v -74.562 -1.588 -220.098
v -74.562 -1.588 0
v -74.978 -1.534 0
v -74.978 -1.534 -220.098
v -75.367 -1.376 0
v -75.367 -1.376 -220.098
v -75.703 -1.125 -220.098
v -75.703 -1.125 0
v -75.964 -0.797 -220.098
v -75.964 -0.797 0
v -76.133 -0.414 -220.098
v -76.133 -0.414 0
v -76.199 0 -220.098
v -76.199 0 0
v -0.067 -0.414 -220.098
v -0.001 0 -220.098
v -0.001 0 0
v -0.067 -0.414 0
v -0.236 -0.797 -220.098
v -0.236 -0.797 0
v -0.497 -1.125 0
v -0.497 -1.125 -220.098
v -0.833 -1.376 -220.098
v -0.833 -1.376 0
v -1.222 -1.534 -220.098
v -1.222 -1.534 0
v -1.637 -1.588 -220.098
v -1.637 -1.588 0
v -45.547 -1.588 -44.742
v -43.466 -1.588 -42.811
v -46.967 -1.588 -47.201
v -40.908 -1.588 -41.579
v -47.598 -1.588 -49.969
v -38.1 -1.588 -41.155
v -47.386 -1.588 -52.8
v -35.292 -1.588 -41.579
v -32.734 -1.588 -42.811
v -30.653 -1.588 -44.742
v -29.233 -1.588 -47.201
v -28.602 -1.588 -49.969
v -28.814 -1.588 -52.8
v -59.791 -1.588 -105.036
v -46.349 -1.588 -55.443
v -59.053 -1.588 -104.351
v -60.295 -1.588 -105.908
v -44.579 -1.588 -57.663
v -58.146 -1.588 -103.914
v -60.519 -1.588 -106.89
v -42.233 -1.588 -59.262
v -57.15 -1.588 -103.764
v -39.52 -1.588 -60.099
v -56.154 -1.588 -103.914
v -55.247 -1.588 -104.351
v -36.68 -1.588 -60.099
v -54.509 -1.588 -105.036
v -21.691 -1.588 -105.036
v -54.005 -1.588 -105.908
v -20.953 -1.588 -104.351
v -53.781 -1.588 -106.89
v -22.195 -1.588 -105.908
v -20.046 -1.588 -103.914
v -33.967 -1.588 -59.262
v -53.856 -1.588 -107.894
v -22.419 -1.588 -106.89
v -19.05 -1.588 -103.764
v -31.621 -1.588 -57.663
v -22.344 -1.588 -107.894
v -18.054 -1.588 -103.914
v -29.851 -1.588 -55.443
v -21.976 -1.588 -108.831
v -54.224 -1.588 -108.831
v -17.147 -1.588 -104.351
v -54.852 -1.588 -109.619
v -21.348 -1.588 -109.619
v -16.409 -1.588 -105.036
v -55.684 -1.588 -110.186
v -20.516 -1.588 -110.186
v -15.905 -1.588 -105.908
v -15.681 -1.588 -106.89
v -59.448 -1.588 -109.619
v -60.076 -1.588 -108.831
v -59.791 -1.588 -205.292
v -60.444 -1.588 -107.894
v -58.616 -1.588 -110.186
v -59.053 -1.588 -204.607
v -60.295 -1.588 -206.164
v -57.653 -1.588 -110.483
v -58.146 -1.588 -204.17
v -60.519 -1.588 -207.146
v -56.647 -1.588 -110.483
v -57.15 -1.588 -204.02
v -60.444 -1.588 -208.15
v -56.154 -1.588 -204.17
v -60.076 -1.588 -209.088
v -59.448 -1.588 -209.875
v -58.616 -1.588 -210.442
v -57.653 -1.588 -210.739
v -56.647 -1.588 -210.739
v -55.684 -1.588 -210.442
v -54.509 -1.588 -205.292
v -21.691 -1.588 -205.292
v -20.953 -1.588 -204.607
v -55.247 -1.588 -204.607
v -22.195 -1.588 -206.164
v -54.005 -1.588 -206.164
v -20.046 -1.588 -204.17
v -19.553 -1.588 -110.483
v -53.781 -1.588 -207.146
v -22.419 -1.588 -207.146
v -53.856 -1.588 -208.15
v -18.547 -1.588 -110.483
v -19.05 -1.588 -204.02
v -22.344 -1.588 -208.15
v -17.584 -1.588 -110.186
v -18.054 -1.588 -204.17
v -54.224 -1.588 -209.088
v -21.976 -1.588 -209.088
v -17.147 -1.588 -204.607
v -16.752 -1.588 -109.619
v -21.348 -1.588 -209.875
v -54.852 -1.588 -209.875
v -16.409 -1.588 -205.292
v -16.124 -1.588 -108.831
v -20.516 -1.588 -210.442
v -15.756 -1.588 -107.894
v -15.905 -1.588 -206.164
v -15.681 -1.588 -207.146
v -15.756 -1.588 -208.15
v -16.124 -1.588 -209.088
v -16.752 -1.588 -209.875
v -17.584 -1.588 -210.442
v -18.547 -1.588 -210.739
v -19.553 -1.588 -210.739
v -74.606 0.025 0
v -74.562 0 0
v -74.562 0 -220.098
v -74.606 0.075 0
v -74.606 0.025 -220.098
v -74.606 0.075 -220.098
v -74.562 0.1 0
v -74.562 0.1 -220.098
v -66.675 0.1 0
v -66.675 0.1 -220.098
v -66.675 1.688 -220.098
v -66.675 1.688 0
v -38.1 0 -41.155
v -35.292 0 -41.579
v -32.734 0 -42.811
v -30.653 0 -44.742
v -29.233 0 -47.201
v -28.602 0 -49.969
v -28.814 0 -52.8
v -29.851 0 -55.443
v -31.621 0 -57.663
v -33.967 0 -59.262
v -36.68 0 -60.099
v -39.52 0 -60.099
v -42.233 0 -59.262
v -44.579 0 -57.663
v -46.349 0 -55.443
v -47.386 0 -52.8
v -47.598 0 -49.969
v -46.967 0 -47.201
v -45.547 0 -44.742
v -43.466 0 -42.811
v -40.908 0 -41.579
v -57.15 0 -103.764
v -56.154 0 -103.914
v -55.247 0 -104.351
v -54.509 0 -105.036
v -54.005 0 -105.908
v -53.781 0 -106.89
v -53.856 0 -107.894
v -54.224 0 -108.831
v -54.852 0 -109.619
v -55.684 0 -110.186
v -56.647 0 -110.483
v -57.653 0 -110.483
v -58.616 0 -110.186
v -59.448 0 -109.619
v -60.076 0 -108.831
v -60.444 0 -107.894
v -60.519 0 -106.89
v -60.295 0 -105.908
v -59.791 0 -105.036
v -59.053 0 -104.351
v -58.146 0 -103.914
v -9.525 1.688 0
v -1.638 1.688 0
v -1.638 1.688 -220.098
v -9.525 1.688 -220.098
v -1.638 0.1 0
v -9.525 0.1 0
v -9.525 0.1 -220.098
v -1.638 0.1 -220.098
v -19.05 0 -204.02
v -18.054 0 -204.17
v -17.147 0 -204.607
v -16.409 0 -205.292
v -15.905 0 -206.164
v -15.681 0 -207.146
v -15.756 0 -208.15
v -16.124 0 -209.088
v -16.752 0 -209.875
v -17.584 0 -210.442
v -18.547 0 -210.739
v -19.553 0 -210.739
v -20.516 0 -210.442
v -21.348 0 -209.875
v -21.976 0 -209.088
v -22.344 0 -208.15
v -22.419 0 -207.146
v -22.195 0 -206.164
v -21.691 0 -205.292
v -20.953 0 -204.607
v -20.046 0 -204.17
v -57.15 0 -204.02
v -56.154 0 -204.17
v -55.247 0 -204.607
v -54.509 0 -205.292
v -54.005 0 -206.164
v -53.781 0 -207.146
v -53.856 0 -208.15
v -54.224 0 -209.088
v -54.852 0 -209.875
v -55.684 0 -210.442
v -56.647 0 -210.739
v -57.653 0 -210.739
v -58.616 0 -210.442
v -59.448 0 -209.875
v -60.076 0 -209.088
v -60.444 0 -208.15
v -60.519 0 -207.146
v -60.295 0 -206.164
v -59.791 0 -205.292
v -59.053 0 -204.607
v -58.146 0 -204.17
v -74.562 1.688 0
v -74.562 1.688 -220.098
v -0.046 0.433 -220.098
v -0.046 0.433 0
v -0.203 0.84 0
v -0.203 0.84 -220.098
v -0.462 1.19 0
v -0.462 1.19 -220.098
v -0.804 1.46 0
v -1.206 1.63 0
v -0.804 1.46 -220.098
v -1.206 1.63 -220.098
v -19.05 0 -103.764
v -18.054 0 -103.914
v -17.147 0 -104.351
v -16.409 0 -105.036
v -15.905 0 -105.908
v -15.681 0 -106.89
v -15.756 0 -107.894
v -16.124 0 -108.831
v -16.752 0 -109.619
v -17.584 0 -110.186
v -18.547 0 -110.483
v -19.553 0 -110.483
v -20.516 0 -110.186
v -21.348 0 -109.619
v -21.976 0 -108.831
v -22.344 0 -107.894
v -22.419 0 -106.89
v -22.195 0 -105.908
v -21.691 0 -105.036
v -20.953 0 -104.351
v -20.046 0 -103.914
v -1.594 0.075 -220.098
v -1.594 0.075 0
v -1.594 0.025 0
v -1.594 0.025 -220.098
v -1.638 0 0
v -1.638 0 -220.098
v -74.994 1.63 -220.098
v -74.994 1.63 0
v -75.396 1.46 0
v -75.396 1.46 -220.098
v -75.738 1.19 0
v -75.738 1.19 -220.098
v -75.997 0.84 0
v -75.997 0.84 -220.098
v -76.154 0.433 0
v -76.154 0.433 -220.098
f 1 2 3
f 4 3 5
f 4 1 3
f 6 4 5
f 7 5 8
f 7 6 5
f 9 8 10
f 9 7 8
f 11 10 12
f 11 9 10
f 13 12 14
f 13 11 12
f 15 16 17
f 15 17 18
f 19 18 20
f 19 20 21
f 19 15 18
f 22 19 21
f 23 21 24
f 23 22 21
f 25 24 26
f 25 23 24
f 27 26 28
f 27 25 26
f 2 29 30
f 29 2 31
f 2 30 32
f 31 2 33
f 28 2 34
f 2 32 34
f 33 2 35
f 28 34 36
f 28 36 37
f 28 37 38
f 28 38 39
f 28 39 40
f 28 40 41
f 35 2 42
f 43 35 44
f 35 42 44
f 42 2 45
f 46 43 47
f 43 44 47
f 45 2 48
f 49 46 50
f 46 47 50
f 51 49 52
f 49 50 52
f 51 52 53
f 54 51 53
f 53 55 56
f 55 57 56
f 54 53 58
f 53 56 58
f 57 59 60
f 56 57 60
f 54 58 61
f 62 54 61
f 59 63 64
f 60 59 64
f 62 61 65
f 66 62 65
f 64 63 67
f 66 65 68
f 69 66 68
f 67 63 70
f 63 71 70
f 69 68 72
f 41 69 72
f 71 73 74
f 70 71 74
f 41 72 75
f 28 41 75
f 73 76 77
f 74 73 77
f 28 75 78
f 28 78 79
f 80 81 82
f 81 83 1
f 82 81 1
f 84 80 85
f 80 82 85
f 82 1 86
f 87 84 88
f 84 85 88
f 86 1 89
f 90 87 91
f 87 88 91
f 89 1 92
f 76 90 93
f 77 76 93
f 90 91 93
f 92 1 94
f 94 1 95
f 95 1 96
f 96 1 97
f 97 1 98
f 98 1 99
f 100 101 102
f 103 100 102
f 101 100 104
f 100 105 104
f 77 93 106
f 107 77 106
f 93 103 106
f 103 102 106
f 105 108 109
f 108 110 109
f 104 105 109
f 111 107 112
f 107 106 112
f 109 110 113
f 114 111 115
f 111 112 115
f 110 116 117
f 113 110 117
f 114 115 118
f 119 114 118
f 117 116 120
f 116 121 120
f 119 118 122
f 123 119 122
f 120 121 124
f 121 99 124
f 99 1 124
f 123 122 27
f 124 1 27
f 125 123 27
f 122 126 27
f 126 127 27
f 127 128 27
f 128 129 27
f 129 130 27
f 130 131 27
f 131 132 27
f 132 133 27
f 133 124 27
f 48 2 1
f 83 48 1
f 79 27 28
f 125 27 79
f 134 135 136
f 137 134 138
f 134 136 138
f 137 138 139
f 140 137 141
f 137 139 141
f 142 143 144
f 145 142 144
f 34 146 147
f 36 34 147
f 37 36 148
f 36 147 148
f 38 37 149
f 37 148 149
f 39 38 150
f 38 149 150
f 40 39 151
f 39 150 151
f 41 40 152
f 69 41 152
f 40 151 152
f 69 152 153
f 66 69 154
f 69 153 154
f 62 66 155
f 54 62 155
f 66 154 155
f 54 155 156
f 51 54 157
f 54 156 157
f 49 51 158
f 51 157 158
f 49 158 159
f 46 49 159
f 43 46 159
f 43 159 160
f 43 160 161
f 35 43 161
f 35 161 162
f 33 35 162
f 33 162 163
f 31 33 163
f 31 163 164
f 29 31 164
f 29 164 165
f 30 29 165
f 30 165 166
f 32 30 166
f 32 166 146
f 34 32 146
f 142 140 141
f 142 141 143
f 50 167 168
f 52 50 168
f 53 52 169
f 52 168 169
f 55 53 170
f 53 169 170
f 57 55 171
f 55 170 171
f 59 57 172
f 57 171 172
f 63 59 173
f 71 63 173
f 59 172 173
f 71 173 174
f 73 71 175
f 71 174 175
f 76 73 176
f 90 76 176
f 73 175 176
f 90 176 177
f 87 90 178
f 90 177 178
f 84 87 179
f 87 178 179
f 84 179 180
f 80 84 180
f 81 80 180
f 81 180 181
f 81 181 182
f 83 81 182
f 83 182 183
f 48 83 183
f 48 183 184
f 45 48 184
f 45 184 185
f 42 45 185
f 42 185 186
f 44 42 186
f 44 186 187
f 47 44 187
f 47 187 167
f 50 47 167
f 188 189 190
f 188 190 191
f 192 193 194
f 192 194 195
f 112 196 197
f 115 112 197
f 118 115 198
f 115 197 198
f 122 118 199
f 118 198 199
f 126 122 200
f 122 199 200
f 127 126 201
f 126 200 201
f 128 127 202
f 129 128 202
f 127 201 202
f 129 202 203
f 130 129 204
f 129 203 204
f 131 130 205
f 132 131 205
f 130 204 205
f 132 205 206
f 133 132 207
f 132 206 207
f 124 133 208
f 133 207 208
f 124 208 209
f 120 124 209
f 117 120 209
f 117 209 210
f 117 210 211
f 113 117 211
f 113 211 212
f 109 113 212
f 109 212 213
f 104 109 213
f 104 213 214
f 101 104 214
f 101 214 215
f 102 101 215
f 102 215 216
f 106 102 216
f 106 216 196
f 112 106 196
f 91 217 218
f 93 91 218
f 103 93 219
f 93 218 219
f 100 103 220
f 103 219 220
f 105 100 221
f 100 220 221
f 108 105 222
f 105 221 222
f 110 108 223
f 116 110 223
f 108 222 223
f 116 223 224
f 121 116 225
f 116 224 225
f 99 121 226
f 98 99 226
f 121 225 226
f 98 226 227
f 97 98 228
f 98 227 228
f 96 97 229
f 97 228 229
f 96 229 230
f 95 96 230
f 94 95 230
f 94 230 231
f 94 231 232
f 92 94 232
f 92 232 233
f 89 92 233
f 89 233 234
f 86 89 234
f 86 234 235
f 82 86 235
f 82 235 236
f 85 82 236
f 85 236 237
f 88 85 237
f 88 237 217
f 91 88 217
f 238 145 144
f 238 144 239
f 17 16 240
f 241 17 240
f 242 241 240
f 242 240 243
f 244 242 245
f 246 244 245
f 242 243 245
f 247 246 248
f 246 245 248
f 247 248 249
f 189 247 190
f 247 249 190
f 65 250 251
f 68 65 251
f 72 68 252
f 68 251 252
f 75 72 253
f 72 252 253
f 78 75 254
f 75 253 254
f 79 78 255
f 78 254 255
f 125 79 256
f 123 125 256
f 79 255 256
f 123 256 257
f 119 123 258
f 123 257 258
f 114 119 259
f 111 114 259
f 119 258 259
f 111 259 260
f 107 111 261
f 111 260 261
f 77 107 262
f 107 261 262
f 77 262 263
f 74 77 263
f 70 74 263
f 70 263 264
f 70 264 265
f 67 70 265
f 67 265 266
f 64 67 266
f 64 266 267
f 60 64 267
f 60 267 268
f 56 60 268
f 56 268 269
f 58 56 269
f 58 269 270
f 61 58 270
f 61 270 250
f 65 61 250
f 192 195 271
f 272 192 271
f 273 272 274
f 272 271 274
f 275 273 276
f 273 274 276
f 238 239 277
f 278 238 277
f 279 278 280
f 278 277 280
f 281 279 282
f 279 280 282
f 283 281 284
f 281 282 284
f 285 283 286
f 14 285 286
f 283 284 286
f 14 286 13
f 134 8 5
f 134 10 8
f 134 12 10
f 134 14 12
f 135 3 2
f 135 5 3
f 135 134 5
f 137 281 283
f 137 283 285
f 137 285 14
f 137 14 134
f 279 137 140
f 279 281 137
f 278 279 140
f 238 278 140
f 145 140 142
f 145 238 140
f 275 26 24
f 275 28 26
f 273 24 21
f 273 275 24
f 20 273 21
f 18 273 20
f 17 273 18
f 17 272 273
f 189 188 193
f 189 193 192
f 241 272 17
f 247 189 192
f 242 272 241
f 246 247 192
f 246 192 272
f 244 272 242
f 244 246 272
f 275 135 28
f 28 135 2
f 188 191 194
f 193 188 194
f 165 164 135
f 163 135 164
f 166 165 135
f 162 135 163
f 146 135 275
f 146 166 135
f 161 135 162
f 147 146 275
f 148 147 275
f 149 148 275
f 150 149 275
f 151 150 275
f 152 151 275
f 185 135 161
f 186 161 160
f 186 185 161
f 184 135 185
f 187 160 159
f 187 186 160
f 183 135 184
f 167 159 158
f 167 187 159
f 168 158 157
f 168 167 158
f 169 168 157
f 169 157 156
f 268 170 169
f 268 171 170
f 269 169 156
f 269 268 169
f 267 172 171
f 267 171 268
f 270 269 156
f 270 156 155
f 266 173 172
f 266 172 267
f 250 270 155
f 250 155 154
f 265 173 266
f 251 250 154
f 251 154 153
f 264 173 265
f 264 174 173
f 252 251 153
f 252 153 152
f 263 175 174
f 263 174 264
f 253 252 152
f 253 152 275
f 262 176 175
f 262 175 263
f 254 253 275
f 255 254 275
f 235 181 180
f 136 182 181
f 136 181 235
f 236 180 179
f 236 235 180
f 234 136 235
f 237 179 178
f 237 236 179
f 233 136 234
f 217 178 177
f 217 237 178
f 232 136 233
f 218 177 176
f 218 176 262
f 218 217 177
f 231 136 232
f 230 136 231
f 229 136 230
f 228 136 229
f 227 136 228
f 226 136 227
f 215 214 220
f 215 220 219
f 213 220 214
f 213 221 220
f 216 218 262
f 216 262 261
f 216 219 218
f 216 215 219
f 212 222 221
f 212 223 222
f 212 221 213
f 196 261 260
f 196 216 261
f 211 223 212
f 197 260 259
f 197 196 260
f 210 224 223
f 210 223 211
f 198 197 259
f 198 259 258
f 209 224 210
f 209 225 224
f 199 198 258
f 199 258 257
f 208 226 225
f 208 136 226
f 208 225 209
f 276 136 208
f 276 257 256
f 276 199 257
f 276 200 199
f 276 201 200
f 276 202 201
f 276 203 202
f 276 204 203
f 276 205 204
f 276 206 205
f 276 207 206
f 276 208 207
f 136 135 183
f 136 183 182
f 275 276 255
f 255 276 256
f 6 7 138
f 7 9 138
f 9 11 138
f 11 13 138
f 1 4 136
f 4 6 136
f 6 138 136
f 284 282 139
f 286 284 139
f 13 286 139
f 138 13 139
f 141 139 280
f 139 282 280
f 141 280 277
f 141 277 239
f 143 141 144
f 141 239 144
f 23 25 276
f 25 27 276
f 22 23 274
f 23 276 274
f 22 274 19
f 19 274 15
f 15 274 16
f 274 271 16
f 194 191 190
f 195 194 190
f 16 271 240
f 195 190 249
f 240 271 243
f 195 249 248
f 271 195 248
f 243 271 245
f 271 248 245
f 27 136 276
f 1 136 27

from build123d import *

# Parameters (mm, degrees)
SKETCH1_W          = 76.2
SKETCH1_H          = 220.098493
BASE_FLANGE1_DEPTH = 1.5875
CUT_EXTRUDE1_REACH = 234.921
SKETCH6_R          = 3.3782
SKETCH7_R          = 9.525
CUT_EXTRUDE2_DEPTH = 233.921245869
HEM1_START         = -220.098493
HEM1_DEPTH         = 220.098493
HEM1_2_DEPTH       = 220.098493


# Read off the part's stored shape, not the designer's step: Hem1
# Sheet-metal steps are written as plain solids
with BuildPart() as part:
    # Sketch1 → Base-Flange1 (new body)
    with BuildSketch(Plane(origin=(0, 0, 0), x_dir=(1, 0, 0), z_dir=(0, 1, 0))):
        with Locations((-38.1, 110.0492465)):
            Rectangle(SKETCH1_W, SKETCH1_H)
    extrude(amount=-BASE_FLANGE1_DEPTH)

    # Sketch6 → Cut-Extrude1 (cut, up to next)
    with BuildSketch(Plane(origin=(0, 0, 0), x_dir=(1, 0, 0), z_dir=(0, 1, 0)), mode=Mode.PRIVATE) as cut_extrude1_sk1:
        with Locations(Location((-57.15, 207.398493, 0), (0, 0, 270))):
            Circle(SKETCH6_R)
    cut_extrude1_tool1 = extrude(cut_extrude1_sk1.sketch, amount=-CUT_EXTRUDE1_REACH, mode=Mode.PRIVATE) & part.part
    # Sketch6 → Cut-Extrude1 (cut, up to next)
    with BuildSketch(Plane(origin=(0, 0, 0), x_dir=(1, 0, 0), z_dir=(0, 1, 0)), mode=Mode.PRIVATE) as cut_extrude1_sk2:
        with Locations(Location((-19.05, 207.398493, 0), (0, 0, 270))):
            Circle(SKETCH6_R)
    cut_extrude1_tool2 = extrude(cut_extrude1_sk2.sketch, amount=-CUT_EXTRUDE1_REACH, mode=Mode.PRIVATE) & part.part
    # Sketch6 → Cut-Extrude1 (cut, up to next)
    with BuildSketch(Plane(origin=(0, 0, 0), x_dir=(1, 0, 0), z_dir=(0, 1, 0)), mode=Mode.PRIVATE) as cut_extrude1_sk3:
        with Locations(Location((-19.05, 107.14228, 0), (0, 0, 270))):
            Circle(SKETCH6_R)
    cut_extrude1_tool3 = extrude(cut_extrude1_sk3.sketch, amount=-CUT_EXTRUDE1_REACH, mode=Mode.PRIVATE) & part.part
    # Sketch6 → Cut-Extrude1 (cut, up to next)
    with BuildSketch(Plane(origin=(0, 0, 0), x_dir=(1, 0, 0), z_dir=(0, 1, 0)), mode=Mode.PRIVATE) as cut_extrude1_sk4:
        with Locations(Location((-57.15, 107.14228, 0), (0, 0, 270))):
            Circle(SKETCH6_R)
    cut_extrude1_tool4 = extrude(cut_extrude1_sk4.sketch, amount=-CUT_EXTRUDE1_REACH, mode=Mode.PRIVATE) & part.part
    add(cut_extrude1_tool1.solids().sort_by_distance((-57.15, 0, -207.398493))[0], mode=Mode.SUBTRACT)
    add(cut_extrude1_tool2.solids().sort_by_distance((-19.05, 0, -207.398493))[0], mode=Mode.SUBTRACT)
    add(cut_extrude1_tool3.solids().sort_by_distance((-19.05, 0, -107.14228))[0], mode=Mode.SUBTRACT)
    add(cut_extrude1_tool4.solids().sort_by_distance((-57.15, 0, -107.14228))[0], mode=Mode.SUBTRACT)

    # Sketch7 → Cut-Extrude2 (cut, through all)
    with BuildSketch(Plane(origin=(0, 0, 0), x_dir=(1, 0, 0), z_dir=(0, 1, 0))):
        with Locations(Location((-38.1, 50.680493, 0), (0, 0, 270))):
            Circle(SKETCH7_R)
    extrude(amount=-CUT_EXTRUDE2_DEPTH, mode=Mode.SUBTRACT)

    # Hem1 outline → Hem1 (cut)
    with BuildSketch(Plane.XY.offset(HEM1_START)):
        with BuildLine():
            ThreePointArc((-74.5625, -1.5875), (-75.70257264, -1.125432101), (-76.199236463, 0))
            Line((-76.199236463, 0), (-76.2, 0))
            Line((-76.2, 0), (-76.2, -1.5875))
            Line((-76.2, -1.5875), (-74.5625, -1.5875))
        make_face()
        with BuildLine():
            ThreePointArc((-0.000763537, 0), (-0.49742736, -1.125432101), (-1.6375, -1.5875))
            Line((-1.6375, -1.5875), (0, -1.5875))
            Line((0, -1.5875), (0, 0))
            Line((0, 0), (-0.000763537, 0))
        make_face()
    extrude(amount=HEM1_DEPTH, mode=Mode.SUBTRACT)

    # Hem1 2 outline → Hem1 2 (add)
    with BuildSketch(Plane.XY.offset(HEM1_START)):
        with BuildLine():
            Line((-66.675, 0.1), (-66.675, 1.6875))
            Line((-66.675, 1.6875), (-74.5625, 1.6875))
            ThreePointArc((-74.5625, 1.6875), (-75.737932101, 1.19007264), (-76.199236463, 0))
            Line((-76.199236463, 0), (-74.5625, 0))
            ThreePointArc((-74.5625, 0), (-74.6125, 0.05), (-74.5625, 0.1))
            Line((-74.5625, 0.1), (-66.675, 0.1))
        make_face()
        with BuildLine():
            ThreePointArc((-1.6375, 0.1), (-1.5875, 0.05), (-1.6375, 0))
            Line((-1.6375, 0), (-0.000763537, 0))
            ThreePointArc((-0.000763537, 0), (-0.462067899, 1.19007264), (-1.6375, 1.6875))
            Line((-1.6375, 1.6875), (-9.525, 1.6875))
            Line((-9.525, 1.6875), (-9.525, 0.1))
            Line((-9.525, 0.1), (-1.6375, 0.1))
        make_face()
    extrude(amount=HEM1_2_DEPTH)


solid = part.part
